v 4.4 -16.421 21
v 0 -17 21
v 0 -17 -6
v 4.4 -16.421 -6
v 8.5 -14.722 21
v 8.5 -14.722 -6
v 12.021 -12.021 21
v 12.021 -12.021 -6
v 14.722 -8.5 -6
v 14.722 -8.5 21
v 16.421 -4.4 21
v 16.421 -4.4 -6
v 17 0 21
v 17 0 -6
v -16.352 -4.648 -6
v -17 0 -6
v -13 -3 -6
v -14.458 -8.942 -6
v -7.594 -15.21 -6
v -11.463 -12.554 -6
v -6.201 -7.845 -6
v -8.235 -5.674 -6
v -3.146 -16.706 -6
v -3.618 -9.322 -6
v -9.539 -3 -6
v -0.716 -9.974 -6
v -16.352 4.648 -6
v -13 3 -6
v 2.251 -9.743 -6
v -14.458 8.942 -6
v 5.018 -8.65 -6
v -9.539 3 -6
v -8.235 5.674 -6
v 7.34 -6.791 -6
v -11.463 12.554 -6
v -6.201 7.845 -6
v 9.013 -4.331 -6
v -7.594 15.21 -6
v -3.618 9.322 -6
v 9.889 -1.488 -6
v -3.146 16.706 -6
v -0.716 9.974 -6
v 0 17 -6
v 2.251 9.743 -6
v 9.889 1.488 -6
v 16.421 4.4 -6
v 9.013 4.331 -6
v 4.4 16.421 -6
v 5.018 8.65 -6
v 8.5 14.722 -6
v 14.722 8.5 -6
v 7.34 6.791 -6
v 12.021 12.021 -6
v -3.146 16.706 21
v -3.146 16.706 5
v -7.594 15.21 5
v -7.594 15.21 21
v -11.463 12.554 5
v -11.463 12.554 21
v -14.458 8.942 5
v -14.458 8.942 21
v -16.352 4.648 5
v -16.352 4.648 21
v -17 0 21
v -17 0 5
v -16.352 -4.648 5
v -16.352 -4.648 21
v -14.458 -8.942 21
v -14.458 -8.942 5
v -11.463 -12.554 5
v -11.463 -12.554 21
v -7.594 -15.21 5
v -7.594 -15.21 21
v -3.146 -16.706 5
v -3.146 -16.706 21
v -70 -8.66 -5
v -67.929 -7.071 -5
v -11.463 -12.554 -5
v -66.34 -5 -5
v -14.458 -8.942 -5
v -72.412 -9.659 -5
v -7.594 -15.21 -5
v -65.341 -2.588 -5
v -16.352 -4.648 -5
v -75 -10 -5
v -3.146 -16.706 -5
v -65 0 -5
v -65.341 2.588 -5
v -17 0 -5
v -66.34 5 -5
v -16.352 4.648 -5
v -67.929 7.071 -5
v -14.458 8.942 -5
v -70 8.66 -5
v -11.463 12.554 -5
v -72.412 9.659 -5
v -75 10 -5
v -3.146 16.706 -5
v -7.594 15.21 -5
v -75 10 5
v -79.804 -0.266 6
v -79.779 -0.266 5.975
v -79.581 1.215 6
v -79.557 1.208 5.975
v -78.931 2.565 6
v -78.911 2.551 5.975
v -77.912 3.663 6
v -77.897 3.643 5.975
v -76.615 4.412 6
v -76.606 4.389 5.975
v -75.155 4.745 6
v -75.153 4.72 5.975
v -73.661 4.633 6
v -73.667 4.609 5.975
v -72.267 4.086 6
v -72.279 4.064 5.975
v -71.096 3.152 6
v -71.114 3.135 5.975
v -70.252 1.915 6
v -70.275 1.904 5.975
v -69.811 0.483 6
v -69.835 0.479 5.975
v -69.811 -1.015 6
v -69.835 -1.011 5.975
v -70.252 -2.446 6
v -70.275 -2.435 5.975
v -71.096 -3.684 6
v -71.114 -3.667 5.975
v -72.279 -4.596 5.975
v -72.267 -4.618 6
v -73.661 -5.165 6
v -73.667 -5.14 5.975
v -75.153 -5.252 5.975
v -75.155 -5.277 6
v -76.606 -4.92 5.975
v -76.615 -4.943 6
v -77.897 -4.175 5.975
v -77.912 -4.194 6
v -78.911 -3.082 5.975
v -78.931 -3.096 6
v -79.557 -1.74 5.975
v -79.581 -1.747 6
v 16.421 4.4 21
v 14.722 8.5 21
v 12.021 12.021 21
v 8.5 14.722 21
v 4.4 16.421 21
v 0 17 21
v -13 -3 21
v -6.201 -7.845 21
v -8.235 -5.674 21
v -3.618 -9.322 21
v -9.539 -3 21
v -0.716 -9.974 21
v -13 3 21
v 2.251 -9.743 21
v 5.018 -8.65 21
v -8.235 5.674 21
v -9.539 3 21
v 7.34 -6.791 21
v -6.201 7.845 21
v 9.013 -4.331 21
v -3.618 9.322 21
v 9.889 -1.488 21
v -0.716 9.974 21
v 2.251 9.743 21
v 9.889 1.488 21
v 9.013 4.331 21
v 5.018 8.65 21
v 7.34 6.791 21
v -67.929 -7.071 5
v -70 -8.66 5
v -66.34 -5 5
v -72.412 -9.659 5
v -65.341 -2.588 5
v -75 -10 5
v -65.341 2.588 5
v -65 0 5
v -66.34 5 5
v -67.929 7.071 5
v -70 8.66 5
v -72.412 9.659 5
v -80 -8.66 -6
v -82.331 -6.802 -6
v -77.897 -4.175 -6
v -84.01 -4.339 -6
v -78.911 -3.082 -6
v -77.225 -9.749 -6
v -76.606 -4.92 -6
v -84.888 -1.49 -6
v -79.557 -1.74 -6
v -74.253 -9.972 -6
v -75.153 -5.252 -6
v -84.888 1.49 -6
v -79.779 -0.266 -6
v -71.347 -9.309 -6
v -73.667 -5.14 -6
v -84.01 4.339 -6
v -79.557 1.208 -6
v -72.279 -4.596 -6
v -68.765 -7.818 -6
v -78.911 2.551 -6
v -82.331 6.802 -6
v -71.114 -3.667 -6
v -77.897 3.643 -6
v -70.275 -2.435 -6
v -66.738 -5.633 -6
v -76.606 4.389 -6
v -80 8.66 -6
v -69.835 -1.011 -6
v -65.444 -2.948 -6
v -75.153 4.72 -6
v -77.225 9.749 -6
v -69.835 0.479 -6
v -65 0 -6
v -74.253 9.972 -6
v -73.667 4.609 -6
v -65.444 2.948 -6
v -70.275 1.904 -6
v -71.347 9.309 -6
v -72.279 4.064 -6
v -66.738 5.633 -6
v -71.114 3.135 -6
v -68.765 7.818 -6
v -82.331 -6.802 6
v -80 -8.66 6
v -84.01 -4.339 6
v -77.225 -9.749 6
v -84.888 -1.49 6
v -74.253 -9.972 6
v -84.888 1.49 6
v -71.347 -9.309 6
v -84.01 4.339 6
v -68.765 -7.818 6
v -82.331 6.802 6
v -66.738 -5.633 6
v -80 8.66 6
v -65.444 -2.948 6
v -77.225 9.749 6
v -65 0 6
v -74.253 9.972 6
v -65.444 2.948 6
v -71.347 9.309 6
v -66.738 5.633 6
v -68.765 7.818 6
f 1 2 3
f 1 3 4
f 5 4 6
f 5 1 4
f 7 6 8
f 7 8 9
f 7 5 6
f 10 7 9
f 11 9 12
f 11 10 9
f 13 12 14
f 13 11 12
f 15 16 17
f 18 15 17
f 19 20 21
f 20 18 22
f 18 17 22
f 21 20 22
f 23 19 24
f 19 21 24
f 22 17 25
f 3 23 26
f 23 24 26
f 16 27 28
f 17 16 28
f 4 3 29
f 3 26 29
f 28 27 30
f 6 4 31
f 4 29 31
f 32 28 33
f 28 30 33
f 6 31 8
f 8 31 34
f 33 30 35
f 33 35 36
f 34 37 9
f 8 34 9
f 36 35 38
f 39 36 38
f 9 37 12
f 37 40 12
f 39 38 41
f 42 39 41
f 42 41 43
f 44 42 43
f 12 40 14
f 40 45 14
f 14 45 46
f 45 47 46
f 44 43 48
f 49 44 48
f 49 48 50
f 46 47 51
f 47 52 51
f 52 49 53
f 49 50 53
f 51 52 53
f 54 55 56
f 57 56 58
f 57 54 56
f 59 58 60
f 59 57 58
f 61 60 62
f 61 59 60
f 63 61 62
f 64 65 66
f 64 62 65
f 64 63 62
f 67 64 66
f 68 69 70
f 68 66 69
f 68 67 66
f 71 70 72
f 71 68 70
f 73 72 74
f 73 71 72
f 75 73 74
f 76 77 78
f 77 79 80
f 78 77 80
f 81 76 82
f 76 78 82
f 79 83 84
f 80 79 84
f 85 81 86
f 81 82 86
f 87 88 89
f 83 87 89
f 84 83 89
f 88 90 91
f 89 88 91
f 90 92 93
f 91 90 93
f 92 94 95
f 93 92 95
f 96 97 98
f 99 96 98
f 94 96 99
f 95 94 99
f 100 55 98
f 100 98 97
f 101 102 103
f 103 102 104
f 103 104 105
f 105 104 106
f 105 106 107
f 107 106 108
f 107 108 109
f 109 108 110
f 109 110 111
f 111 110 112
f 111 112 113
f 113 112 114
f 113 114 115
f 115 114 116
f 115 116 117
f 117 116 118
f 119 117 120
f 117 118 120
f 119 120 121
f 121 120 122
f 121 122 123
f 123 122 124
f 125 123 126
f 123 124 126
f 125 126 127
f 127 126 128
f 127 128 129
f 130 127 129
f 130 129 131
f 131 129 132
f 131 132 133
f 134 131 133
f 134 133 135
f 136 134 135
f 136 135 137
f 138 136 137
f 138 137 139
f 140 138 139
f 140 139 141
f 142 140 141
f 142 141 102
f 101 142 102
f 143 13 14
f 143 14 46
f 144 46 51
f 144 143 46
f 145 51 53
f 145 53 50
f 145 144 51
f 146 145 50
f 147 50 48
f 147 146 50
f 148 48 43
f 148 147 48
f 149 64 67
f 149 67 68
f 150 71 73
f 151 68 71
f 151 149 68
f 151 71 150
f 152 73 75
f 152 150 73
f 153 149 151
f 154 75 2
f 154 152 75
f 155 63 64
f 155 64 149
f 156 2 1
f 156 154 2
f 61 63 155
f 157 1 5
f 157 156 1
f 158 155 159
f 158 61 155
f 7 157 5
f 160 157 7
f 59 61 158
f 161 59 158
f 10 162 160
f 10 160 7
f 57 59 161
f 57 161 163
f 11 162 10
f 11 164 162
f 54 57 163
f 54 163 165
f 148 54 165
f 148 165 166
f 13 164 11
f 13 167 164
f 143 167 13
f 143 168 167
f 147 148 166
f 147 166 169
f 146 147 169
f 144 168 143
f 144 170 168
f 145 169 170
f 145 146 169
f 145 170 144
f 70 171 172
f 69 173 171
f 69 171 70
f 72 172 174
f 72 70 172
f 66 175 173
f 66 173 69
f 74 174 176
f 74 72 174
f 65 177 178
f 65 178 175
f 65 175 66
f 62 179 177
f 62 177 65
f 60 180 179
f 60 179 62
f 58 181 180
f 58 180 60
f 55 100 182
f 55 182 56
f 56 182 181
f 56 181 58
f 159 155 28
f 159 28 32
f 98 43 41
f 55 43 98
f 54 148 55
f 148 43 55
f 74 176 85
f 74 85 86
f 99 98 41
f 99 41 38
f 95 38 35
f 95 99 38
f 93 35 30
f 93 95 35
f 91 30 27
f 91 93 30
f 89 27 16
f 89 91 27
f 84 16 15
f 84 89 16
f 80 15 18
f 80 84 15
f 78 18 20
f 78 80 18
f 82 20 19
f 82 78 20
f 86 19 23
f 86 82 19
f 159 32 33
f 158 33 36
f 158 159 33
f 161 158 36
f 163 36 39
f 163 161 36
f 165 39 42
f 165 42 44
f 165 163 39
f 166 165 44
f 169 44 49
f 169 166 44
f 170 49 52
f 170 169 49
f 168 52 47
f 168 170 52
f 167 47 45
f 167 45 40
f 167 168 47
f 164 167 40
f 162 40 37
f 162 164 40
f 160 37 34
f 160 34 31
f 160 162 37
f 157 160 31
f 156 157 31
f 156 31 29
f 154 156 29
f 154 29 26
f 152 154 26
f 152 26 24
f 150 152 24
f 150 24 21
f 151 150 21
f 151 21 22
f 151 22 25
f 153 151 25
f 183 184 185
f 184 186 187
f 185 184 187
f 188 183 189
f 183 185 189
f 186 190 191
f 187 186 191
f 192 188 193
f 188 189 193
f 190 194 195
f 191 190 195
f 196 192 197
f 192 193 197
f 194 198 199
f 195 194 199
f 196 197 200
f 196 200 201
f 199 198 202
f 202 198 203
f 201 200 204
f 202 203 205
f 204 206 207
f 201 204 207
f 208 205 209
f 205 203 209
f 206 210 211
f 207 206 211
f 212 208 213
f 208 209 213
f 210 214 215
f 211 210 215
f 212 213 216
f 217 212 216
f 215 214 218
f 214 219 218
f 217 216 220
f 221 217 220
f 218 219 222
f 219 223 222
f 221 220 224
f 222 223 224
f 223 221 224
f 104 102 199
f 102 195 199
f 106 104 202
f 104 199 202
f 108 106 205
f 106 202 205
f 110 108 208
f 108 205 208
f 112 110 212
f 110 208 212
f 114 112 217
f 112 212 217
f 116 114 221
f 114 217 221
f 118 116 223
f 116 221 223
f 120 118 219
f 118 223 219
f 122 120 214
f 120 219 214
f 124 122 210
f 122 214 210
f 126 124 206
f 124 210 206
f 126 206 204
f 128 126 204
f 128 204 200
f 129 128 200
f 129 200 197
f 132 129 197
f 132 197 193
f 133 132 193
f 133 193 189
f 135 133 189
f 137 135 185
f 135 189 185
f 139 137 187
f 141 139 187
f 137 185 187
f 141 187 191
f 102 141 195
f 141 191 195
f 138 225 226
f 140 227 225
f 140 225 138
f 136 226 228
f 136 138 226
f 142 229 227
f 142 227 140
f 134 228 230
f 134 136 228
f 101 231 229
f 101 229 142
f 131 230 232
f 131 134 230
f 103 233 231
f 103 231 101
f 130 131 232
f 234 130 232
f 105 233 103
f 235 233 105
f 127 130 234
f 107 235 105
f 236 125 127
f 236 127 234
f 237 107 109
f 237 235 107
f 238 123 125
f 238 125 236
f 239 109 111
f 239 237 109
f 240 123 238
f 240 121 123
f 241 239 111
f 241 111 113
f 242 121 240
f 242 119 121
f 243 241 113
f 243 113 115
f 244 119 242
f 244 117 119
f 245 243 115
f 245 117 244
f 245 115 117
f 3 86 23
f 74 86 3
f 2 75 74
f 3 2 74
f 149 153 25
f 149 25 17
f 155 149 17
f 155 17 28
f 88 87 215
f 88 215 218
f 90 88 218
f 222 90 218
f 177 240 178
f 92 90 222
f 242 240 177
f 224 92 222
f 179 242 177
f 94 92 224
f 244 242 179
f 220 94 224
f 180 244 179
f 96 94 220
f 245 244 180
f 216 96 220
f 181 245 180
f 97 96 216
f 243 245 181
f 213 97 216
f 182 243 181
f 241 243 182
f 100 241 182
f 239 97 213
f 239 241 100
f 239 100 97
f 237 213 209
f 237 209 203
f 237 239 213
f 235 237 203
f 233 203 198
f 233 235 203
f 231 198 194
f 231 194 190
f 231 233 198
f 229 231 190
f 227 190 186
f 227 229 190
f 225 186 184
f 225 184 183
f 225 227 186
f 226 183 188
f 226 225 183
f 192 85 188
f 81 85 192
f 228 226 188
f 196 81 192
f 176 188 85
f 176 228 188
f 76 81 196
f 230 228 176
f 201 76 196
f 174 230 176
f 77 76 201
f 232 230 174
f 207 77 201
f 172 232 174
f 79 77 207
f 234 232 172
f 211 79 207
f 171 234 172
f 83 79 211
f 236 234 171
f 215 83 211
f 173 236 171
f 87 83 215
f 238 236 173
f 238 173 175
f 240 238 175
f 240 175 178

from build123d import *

# Parameters (mm, degrees)
ESTRUSIONE_ESTRUSIONE1_DEPTH = 5
SCHIZZO1_4_R                 = 10
ESTRUSIONE_ESTRUSIONE2_DEPTH = 6
ESTRUSIONE_ESTRUSIONE3_START = 21
ESTRUSIONE_ESTRUSIONE3_DEPTH = 27
FORO_10_0_10_1_D             = 10
FORO_10_0_10_1_CSINK_D       = 10.05
FORO_10_0_10_1_CSINK_ANGLE   = 90


with BuildPart() as part:
    # Schizzo1 → Estrusione-Estrusione1 (new, symmetric)
    with BuildSketch(Plane.XY):
        with BuildLine():
            ThreePointArc((-3.145928798, -16.706379979), (-17, 0), (-3.145928798, 16.706379979))
            Line((-3.145928798, 16.706379979), (-75, 10))
            ThreePointArc((-75, 10), (-67.928932188, 7.071067812), (-65, 0))
            ThreePointArc((-65, 0), (-67.928932188, -7.071067812), (-75, -10))
            Line((-75, -10), (-3.145928798, -16.706379979))
        make_face()
    extrude(amount=ESTRUSIONE_ESTRUSIONE1_DEPTH, both=True)

    # Schizzo1<4> → Estrusione-Estrusione2 (add, symmetric)
    with BuildSketch(Plane.XY):
        with Locations((-75, 0)):
            Circle(SCHIZZO1_4_R)
    extrude(amount=ESTRUSIONE_ESTRUSIONE2_DEPTH, both=True)

    # Schizzo1<5> → Estrusione-Estrusione3 (add)
    with BuildSketch(Plane.XY.offset(ESTRUSIONE_ESTRUSIONE3_START)):
        with BuildLine():
            ThreePointArc((17, 0), (12.02081528, 12.02081528), (0, 17))
            Line((0, 17), (-3.145928798, 16.706379979))
            ThreePointArc((-3.145928798, 16.706379979), (-17, 0), (-3.145928798, -16.706379979))
            Line((-3.145928798, -16.706379979), (0, -17))
            ThreePointArc((0, -17), (12.02081528, -12.02081528), (17, 0))
        make_face()
        with BuildLine():
            Line((-13, 3), (-9.539392014, 3))
            ThreePointArc((-9.539392014, 3), (10, 0), (-9.539392014, -3))
            Line((-9.539392014, -3), (-13, -3))
            Line((-13, -3), (-13, 3))
        make_face(mode=Mode.SUBTRACT)
    extrude(amount=-ESTRUSIONE_ESTRUSIONE3_DEPTH)

    # Foro Ø10.0 (10)-1 (through all)
    with Locations(Plane(origin=(-74.779419459, -0.265735381, 6), x_dir=(1, 0, 0), z_dir=(0, 0, 1))):
        with Locations((0, 0)):
            CounterSinkHole(FORO_10_0_10_1_D / 2, FORO_10_0_10_1_CSINK_D / 2, counter_sink_angle=FORO_10_0_10_1_CSINK_ANGLE)


solid = part.part
